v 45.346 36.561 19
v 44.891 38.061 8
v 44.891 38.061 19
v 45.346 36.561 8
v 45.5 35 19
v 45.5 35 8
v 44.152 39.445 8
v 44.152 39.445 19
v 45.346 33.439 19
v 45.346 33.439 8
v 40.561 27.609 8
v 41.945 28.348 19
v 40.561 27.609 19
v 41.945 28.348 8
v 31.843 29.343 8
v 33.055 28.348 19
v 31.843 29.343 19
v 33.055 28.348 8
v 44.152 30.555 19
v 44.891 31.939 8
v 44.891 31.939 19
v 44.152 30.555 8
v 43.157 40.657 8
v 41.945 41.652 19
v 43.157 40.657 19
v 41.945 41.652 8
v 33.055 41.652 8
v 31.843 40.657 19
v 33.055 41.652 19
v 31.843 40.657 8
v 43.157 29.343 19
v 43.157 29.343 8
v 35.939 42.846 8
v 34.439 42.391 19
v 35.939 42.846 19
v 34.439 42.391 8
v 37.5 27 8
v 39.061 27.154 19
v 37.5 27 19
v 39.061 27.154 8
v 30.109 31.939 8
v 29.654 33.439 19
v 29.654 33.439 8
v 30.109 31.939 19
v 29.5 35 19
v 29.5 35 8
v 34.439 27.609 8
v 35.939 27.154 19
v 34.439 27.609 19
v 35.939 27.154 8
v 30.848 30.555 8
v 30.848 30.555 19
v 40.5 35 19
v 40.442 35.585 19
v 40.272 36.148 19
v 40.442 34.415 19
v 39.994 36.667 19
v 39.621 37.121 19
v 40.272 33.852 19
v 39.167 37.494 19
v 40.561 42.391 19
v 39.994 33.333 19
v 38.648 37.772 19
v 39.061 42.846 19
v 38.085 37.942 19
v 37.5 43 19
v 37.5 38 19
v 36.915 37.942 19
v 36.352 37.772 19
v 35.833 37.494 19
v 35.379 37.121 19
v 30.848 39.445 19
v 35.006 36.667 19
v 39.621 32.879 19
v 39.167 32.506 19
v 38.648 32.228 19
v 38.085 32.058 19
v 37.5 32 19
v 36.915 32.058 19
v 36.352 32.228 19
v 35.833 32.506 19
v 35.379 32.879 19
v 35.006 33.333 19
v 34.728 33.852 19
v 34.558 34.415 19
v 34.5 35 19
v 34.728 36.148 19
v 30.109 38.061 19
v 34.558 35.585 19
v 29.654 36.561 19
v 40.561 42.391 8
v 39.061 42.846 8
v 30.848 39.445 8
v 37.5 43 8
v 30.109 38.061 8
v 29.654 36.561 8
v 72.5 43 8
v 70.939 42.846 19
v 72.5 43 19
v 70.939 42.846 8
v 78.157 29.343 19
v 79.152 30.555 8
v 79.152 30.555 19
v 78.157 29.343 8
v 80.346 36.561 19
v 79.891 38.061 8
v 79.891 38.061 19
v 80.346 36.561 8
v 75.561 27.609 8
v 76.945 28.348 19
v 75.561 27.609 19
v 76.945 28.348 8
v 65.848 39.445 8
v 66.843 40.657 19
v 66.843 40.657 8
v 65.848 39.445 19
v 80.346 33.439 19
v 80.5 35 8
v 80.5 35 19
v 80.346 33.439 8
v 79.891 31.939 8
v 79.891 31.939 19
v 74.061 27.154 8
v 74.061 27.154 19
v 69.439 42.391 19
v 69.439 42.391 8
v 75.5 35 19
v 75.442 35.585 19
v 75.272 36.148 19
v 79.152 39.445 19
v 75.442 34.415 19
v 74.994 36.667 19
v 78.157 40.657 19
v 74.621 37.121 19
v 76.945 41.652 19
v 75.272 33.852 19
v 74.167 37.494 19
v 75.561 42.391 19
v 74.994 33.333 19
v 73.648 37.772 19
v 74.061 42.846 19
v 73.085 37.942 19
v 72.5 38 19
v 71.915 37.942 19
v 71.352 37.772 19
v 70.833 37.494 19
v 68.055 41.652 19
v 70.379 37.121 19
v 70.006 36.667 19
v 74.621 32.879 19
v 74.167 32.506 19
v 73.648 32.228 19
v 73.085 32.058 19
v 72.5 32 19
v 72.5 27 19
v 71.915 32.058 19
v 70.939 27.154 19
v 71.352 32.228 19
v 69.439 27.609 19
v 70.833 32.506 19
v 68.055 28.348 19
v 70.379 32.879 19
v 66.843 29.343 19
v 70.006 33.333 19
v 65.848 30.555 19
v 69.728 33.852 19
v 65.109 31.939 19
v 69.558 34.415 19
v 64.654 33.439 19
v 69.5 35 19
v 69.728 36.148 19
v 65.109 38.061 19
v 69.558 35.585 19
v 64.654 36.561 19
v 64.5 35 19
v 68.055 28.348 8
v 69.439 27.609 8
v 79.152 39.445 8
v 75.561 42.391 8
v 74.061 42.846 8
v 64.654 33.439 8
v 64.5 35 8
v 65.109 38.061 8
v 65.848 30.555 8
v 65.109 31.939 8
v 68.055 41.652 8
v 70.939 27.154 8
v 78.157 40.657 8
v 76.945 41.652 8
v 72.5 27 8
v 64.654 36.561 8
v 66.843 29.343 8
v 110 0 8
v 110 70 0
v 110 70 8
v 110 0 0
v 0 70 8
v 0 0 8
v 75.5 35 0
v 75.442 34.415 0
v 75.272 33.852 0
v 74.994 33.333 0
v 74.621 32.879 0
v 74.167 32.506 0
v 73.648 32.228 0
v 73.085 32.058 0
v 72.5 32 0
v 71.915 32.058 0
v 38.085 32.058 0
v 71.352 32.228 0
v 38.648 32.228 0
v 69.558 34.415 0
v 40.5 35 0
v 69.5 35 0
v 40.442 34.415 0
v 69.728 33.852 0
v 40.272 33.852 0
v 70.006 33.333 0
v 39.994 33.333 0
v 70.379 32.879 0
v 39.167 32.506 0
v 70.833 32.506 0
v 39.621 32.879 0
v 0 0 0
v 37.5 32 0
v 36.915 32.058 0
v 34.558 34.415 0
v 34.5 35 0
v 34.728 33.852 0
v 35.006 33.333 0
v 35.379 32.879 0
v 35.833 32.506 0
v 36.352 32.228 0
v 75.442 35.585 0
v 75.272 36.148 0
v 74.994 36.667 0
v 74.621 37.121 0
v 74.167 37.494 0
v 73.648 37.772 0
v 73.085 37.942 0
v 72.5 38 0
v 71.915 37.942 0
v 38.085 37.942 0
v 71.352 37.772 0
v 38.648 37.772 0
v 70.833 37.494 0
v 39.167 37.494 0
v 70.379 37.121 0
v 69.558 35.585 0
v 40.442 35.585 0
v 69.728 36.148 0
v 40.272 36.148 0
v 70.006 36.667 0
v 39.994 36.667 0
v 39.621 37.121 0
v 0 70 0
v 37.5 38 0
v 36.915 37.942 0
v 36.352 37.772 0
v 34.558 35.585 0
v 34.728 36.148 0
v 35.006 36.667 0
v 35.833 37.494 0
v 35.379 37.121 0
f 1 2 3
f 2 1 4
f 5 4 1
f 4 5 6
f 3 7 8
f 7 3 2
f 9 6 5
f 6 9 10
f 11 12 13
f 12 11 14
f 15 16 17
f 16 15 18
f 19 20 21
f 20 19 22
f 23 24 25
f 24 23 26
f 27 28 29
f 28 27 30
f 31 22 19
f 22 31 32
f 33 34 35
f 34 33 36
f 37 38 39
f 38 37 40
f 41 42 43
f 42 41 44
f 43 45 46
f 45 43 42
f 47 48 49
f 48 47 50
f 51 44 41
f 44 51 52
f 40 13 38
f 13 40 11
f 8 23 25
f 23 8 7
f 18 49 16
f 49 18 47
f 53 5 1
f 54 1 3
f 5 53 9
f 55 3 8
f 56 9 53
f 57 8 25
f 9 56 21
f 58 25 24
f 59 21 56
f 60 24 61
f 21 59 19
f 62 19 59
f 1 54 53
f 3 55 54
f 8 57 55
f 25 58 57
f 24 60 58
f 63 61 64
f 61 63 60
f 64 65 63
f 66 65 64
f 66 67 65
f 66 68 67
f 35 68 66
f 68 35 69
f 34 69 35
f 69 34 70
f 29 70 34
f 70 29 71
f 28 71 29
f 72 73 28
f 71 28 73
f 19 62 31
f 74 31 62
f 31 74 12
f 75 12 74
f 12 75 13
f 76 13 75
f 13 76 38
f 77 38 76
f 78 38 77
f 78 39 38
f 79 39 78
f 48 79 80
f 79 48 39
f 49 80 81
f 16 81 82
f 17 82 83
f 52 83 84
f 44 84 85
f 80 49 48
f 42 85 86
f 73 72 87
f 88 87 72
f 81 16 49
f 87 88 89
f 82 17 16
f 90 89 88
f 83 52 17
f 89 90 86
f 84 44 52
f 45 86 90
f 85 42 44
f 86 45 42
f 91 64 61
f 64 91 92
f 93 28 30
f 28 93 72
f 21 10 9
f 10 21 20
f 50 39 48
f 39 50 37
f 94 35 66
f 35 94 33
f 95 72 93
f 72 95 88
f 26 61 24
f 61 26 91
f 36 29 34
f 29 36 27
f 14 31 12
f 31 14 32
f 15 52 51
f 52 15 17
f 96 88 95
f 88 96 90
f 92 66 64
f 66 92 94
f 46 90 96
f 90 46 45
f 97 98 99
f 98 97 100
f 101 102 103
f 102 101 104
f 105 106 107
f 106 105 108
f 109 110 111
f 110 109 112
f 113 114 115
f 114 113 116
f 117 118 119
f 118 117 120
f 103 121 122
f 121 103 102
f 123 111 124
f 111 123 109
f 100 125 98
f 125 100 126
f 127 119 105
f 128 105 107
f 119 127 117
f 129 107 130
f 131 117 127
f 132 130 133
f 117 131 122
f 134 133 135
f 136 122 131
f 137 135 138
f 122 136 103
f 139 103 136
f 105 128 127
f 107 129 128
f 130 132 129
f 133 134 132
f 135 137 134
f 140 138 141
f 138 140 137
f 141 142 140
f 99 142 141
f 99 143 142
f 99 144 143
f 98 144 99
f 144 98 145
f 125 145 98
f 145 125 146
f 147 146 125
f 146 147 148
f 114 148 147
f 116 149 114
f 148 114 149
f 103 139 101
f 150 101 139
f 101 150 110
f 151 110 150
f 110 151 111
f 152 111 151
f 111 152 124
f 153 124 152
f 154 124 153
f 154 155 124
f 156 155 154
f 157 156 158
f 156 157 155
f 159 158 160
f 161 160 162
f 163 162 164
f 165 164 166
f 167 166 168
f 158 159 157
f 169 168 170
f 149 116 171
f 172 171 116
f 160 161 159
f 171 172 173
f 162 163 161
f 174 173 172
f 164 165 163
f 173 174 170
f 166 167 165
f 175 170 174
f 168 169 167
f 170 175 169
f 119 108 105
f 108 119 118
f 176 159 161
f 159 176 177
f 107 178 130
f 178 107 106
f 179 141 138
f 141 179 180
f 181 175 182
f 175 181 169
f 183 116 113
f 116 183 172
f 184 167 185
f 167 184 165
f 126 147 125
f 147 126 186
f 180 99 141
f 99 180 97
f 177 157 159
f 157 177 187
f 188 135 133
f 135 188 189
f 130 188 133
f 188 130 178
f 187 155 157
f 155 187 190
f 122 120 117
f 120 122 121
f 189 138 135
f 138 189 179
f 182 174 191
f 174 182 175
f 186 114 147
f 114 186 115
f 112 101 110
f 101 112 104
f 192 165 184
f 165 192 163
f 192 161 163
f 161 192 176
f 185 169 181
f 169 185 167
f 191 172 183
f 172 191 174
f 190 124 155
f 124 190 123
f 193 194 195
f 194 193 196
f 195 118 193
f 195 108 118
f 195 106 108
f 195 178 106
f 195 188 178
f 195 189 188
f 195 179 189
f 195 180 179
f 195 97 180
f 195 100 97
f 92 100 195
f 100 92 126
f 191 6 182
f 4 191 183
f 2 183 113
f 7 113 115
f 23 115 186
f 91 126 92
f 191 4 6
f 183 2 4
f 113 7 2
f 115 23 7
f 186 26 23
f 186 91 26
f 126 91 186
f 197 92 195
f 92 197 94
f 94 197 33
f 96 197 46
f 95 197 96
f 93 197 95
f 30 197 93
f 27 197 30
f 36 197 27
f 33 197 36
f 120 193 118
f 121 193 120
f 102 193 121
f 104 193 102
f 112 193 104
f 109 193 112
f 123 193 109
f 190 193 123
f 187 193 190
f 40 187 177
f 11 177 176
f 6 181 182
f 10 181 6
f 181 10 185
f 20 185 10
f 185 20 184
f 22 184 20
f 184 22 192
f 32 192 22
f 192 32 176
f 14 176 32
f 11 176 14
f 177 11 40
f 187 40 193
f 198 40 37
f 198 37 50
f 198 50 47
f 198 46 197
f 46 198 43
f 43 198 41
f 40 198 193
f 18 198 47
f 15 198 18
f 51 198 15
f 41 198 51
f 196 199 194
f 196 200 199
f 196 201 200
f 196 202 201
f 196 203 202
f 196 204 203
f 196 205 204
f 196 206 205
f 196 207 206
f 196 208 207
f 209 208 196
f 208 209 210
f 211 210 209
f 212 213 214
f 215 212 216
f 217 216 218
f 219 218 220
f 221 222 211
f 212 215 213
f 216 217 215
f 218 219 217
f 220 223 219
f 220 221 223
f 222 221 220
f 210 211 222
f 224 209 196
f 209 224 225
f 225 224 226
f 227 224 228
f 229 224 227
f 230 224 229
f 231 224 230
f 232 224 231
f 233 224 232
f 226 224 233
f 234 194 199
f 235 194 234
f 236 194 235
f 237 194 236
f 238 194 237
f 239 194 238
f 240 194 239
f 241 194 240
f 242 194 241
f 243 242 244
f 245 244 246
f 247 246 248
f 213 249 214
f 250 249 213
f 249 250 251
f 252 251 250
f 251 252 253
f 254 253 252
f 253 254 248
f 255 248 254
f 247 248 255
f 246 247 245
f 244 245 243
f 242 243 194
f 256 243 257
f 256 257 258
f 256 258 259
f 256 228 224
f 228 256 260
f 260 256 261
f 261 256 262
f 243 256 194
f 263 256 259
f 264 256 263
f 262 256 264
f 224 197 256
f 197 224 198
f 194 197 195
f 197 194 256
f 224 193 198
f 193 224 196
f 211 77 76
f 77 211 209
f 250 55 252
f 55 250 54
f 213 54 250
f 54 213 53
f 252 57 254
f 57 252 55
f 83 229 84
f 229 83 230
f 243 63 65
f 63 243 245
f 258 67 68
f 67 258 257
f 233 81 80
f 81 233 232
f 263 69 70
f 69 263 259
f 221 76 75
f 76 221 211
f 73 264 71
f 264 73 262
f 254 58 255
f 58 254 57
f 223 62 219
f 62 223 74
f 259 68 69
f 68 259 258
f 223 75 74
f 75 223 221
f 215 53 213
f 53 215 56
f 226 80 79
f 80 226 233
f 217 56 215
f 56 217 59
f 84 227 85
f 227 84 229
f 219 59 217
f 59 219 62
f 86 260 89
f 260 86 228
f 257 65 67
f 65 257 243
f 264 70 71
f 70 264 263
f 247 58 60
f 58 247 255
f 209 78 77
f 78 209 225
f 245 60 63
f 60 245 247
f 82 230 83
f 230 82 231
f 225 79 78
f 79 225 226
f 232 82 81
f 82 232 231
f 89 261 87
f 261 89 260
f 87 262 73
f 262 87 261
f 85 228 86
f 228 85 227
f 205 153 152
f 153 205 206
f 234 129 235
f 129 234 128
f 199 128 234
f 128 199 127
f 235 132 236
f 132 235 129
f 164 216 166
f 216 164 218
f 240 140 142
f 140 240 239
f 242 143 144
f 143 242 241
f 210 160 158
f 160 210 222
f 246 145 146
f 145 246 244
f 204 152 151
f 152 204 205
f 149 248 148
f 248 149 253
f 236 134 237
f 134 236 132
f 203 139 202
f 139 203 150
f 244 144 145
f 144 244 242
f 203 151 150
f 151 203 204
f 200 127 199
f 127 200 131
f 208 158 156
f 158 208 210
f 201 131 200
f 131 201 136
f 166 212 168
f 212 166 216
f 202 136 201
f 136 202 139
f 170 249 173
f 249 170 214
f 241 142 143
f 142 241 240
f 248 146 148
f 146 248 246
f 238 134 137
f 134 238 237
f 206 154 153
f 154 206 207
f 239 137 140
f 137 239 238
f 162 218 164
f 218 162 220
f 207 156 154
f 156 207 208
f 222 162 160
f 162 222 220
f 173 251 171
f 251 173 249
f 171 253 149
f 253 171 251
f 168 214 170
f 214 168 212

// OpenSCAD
$fn = 32;

// ----------------------------------------------------------------------
// Drill jig: two_boss jig
// ----------------------------------------------------------------------

// --- parameters (mm) ---
plate_l = 110;            // plate length, X
plate_w = 70;             // plate width, Y
plate_t = 8;              // plate thickness
boss_d = 16;              // guide boss diameter
boss_h = 12;              // boss height above the plate
guide_d = 6;              // guide hole diameter
boss_pitch = 35;          // boss pitch
fit_tol = 0.1;            // tolerance for press fits, mm
free_tol = 0.3;           // tolerance for clearance fits, mm

n_boss = 2;  // guide bosses
boss_x0 = (plate_l - (n_boss - 1) * boss_pitch) / 2;  // first boss X
boss_top = plate_t - 1 + boss_h;  // boss crown height
total_h = boss_top;  // overall height

difference() {
  union() {
  cube([plate_l, plate_w, plate_t]);
  for (i = [0 : n_boss - 1])
    translate([boss_x0 + i * boss_pitch, plate_w / 2, plate_t - 1])
      cylinder(h = boss_h, d = boss_d);
  }
  for (i = [0 : n_boss - 1])
    translate([boss_x0 + i * boss_pitch, plate_w / 2, -1])
      cylinder(h = plate_t + boss_h, d = guide_d);
}
